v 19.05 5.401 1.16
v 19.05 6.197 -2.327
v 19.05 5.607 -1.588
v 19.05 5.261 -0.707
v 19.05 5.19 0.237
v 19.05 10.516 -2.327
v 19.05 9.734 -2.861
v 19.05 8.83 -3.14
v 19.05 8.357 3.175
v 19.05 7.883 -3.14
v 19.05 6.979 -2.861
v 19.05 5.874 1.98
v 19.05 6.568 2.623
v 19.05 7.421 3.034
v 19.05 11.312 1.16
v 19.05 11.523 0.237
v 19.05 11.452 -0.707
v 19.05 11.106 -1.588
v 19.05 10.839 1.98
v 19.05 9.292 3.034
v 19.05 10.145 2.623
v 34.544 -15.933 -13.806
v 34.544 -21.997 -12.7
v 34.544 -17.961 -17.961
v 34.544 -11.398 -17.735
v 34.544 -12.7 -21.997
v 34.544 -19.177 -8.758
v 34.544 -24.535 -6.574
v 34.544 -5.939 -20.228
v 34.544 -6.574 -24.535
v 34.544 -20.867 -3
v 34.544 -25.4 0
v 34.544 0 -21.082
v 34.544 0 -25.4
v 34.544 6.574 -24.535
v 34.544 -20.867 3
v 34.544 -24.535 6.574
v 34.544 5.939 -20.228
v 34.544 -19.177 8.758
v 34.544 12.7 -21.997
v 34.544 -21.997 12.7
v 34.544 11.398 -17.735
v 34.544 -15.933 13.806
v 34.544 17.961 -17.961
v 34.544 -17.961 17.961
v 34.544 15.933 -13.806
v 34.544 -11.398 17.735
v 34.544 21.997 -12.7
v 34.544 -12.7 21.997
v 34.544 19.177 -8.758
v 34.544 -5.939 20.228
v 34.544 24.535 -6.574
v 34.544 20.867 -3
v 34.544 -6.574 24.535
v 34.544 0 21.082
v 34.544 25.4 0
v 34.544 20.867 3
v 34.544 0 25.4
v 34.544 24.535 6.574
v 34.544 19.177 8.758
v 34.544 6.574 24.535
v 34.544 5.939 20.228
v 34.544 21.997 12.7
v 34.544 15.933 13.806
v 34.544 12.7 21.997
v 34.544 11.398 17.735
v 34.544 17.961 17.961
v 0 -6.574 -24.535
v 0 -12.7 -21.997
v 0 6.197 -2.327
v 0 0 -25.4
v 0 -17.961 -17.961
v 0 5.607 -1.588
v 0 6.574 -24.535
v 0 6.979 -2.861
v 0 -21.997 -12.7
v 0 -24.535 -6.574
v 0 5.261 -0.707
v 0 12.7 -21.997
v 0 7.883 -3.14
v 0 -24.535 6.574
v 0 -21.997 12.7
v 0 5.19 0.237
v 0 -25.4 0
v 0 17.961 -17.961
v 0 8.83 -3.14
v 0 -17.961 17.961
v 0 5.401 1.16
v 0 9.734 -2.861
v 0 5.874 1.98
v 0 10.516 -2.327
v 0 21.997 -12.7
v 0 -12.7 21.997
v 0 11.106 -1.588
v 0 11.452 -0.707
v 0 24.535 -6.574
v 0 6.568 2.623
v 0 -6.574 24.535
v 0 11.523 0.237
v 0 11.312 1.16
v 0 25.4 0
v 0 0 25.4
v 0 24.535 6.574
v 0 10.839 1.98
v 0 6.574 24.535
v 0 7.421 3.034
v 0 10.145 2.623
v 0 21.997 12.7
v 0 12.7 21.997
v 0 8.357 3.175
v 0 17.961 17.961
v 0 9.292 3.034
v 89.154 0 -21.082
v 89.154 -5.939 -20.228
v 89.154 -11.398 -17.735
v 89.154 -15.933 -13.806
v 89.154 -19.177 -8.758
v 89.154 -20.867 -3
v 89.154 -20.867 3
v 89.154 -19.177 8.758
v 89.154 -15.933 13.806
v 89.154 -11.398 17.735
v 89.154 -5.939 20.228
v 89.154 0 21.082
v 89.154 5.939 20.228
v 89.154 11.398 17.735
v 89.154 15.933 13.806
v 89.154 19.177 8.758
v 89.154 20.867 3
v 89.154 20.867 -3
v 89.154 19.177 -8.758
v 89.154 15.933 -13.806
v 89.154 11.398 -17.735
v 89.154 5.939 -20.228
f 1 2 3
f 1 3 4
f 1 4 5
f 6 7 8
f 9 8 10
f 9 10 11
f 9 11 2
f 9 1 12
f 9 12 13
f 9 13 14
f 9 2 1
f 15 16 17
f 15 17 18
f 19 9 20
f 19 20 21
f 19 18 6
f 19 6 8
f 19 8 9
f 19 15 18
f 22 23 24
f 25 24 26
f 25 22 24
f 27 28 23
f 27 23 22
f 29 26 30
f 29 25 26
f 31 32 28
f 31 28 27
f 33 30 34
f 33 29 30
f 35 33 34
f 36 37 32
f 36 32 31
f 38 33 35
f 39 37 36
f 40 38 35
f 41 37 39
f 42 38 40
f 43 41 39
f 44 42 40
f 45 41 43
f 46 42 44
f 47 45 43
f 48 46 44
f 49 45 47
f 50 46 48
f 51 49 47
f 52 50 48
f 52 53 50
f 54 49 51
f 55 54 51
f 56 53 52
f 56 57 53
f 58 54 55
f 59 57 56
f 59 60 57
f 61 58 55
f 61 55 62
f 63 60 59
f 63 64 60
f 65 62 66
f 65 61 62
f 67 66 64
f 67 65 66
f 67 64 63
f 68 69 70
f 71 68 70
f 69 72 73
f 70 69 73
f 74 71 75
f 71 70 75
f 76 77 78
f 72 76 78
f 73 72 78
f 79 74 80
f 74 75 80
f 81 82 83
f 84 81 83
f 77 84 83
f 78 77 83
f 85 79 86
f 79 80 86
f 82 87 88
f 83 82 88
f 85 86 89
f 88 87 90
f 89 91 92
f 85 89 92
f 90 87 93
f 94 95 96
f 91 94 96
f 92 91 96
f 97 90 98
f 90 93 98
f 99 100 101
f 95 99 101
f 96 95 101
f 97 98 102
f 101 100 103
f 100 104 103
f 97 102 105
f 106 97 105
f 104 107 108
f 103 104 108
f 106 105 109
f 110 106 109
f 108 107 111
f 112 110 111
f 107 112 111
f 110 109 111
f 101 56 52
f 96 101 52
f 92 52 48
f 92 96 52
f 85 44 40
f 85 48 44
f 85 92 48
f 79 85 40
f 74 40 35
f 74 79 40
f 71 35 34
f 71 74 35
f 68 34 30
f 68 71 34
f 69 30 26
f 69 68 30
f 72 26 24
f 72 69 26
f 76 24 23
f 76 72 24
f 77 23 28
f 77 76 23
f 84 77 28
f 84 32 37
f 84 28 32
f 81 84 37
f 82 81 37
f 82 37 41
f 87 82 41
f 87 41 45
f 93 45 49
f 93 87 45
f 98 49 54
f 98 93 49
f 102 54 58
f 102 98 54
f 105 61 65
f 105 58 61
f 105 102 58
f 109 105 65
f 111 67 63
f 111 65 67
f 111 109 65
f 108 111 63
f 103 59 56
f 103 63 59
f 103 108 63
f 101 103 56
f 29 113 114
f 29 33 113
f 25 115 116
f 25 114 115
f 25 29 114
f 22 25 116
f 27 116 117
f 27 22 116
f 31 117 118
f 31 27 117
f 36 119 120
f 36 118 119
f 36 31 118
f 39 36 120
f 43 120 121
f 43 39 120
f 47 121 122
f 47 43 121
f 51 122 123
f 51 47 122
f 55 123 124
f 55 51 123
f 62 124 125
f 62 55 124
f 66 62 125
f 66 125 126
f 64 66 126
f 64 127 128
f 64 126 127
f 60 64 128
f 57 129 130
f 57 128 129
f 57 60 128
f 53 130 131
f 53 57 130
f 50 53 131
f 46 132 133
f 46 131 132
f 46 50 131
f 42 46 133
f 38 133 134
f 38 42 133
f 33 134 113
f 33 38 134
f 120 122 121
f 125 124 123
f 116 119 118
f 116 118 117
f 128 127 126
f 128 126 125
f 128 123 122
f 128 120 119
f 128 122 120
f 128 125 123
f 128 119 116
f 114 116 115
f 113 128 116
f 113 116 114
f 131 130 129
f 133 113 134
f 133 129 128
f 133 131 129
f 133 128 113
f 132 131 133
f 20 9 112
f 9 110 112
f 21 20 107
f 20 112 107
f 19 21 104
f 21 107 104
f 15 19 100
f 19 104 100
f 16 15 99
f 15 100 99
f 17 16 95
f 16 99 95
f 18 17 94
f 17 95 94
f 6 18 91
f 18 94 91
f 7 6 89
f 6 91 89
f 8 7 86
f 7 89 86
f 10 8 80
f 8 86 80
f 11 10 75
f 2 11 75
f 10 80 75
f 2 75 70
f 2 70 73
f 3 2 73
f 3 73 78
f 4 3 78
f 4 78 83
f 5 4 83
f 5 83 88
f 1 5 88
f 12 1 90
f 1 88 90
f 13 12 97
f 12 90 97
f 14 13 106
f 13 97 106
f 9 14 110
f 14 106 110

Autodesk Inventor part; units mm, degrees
ref_plane "YZ Plane" through (0, 0, 0) normal (1, 0, 0) x (0, 1, 0)
ref_plane "XZ Plane" through (0, 0, 0) normal (0, 1, 0) x (-1, 0, 0)
ref_plane "XY Plane" through (0, 0, 0) normal (0, 0, 1) x (1, 0, 0)
sketch "Sketch1" plane through (0, 0, 0) normal (1, 0, 0) x (0, 1, 0)
  circle A0 centre (0, 0) radius 25.4
  dimension "d0" = 50.8
extrude "Extrusion1" add sketch "Sketch1" along normal blind 34.544
sketch "Sketch2" plane through (34.544, 0, 0) normal (1, 0, 0) x (0, 0, -1)
  circle A0 centre (0, 0) radius 21.082
  dimension "d3" = 42.164
extrude "Extrusion2" add sketch "Sketch2" along normal blind 54.61
sketch "Sketch3" plane through (0, 0, 0) normal (-1, 0, 0) x (0, 0, 1)
  circle A0 centre (0, 8.3566) radius 3.175
  line L0 (0, 0) -> (0, 8.3566) construction
  circle A1 centre (0, 0) radius 25.4 projected
  dimension "d9" = 6.35
  dimension "d10" = 8.3566
extrude "Extrusion3" cut sketch "Sketch3" against normal blind 19.05 contours A0
properties part number "Motor"
